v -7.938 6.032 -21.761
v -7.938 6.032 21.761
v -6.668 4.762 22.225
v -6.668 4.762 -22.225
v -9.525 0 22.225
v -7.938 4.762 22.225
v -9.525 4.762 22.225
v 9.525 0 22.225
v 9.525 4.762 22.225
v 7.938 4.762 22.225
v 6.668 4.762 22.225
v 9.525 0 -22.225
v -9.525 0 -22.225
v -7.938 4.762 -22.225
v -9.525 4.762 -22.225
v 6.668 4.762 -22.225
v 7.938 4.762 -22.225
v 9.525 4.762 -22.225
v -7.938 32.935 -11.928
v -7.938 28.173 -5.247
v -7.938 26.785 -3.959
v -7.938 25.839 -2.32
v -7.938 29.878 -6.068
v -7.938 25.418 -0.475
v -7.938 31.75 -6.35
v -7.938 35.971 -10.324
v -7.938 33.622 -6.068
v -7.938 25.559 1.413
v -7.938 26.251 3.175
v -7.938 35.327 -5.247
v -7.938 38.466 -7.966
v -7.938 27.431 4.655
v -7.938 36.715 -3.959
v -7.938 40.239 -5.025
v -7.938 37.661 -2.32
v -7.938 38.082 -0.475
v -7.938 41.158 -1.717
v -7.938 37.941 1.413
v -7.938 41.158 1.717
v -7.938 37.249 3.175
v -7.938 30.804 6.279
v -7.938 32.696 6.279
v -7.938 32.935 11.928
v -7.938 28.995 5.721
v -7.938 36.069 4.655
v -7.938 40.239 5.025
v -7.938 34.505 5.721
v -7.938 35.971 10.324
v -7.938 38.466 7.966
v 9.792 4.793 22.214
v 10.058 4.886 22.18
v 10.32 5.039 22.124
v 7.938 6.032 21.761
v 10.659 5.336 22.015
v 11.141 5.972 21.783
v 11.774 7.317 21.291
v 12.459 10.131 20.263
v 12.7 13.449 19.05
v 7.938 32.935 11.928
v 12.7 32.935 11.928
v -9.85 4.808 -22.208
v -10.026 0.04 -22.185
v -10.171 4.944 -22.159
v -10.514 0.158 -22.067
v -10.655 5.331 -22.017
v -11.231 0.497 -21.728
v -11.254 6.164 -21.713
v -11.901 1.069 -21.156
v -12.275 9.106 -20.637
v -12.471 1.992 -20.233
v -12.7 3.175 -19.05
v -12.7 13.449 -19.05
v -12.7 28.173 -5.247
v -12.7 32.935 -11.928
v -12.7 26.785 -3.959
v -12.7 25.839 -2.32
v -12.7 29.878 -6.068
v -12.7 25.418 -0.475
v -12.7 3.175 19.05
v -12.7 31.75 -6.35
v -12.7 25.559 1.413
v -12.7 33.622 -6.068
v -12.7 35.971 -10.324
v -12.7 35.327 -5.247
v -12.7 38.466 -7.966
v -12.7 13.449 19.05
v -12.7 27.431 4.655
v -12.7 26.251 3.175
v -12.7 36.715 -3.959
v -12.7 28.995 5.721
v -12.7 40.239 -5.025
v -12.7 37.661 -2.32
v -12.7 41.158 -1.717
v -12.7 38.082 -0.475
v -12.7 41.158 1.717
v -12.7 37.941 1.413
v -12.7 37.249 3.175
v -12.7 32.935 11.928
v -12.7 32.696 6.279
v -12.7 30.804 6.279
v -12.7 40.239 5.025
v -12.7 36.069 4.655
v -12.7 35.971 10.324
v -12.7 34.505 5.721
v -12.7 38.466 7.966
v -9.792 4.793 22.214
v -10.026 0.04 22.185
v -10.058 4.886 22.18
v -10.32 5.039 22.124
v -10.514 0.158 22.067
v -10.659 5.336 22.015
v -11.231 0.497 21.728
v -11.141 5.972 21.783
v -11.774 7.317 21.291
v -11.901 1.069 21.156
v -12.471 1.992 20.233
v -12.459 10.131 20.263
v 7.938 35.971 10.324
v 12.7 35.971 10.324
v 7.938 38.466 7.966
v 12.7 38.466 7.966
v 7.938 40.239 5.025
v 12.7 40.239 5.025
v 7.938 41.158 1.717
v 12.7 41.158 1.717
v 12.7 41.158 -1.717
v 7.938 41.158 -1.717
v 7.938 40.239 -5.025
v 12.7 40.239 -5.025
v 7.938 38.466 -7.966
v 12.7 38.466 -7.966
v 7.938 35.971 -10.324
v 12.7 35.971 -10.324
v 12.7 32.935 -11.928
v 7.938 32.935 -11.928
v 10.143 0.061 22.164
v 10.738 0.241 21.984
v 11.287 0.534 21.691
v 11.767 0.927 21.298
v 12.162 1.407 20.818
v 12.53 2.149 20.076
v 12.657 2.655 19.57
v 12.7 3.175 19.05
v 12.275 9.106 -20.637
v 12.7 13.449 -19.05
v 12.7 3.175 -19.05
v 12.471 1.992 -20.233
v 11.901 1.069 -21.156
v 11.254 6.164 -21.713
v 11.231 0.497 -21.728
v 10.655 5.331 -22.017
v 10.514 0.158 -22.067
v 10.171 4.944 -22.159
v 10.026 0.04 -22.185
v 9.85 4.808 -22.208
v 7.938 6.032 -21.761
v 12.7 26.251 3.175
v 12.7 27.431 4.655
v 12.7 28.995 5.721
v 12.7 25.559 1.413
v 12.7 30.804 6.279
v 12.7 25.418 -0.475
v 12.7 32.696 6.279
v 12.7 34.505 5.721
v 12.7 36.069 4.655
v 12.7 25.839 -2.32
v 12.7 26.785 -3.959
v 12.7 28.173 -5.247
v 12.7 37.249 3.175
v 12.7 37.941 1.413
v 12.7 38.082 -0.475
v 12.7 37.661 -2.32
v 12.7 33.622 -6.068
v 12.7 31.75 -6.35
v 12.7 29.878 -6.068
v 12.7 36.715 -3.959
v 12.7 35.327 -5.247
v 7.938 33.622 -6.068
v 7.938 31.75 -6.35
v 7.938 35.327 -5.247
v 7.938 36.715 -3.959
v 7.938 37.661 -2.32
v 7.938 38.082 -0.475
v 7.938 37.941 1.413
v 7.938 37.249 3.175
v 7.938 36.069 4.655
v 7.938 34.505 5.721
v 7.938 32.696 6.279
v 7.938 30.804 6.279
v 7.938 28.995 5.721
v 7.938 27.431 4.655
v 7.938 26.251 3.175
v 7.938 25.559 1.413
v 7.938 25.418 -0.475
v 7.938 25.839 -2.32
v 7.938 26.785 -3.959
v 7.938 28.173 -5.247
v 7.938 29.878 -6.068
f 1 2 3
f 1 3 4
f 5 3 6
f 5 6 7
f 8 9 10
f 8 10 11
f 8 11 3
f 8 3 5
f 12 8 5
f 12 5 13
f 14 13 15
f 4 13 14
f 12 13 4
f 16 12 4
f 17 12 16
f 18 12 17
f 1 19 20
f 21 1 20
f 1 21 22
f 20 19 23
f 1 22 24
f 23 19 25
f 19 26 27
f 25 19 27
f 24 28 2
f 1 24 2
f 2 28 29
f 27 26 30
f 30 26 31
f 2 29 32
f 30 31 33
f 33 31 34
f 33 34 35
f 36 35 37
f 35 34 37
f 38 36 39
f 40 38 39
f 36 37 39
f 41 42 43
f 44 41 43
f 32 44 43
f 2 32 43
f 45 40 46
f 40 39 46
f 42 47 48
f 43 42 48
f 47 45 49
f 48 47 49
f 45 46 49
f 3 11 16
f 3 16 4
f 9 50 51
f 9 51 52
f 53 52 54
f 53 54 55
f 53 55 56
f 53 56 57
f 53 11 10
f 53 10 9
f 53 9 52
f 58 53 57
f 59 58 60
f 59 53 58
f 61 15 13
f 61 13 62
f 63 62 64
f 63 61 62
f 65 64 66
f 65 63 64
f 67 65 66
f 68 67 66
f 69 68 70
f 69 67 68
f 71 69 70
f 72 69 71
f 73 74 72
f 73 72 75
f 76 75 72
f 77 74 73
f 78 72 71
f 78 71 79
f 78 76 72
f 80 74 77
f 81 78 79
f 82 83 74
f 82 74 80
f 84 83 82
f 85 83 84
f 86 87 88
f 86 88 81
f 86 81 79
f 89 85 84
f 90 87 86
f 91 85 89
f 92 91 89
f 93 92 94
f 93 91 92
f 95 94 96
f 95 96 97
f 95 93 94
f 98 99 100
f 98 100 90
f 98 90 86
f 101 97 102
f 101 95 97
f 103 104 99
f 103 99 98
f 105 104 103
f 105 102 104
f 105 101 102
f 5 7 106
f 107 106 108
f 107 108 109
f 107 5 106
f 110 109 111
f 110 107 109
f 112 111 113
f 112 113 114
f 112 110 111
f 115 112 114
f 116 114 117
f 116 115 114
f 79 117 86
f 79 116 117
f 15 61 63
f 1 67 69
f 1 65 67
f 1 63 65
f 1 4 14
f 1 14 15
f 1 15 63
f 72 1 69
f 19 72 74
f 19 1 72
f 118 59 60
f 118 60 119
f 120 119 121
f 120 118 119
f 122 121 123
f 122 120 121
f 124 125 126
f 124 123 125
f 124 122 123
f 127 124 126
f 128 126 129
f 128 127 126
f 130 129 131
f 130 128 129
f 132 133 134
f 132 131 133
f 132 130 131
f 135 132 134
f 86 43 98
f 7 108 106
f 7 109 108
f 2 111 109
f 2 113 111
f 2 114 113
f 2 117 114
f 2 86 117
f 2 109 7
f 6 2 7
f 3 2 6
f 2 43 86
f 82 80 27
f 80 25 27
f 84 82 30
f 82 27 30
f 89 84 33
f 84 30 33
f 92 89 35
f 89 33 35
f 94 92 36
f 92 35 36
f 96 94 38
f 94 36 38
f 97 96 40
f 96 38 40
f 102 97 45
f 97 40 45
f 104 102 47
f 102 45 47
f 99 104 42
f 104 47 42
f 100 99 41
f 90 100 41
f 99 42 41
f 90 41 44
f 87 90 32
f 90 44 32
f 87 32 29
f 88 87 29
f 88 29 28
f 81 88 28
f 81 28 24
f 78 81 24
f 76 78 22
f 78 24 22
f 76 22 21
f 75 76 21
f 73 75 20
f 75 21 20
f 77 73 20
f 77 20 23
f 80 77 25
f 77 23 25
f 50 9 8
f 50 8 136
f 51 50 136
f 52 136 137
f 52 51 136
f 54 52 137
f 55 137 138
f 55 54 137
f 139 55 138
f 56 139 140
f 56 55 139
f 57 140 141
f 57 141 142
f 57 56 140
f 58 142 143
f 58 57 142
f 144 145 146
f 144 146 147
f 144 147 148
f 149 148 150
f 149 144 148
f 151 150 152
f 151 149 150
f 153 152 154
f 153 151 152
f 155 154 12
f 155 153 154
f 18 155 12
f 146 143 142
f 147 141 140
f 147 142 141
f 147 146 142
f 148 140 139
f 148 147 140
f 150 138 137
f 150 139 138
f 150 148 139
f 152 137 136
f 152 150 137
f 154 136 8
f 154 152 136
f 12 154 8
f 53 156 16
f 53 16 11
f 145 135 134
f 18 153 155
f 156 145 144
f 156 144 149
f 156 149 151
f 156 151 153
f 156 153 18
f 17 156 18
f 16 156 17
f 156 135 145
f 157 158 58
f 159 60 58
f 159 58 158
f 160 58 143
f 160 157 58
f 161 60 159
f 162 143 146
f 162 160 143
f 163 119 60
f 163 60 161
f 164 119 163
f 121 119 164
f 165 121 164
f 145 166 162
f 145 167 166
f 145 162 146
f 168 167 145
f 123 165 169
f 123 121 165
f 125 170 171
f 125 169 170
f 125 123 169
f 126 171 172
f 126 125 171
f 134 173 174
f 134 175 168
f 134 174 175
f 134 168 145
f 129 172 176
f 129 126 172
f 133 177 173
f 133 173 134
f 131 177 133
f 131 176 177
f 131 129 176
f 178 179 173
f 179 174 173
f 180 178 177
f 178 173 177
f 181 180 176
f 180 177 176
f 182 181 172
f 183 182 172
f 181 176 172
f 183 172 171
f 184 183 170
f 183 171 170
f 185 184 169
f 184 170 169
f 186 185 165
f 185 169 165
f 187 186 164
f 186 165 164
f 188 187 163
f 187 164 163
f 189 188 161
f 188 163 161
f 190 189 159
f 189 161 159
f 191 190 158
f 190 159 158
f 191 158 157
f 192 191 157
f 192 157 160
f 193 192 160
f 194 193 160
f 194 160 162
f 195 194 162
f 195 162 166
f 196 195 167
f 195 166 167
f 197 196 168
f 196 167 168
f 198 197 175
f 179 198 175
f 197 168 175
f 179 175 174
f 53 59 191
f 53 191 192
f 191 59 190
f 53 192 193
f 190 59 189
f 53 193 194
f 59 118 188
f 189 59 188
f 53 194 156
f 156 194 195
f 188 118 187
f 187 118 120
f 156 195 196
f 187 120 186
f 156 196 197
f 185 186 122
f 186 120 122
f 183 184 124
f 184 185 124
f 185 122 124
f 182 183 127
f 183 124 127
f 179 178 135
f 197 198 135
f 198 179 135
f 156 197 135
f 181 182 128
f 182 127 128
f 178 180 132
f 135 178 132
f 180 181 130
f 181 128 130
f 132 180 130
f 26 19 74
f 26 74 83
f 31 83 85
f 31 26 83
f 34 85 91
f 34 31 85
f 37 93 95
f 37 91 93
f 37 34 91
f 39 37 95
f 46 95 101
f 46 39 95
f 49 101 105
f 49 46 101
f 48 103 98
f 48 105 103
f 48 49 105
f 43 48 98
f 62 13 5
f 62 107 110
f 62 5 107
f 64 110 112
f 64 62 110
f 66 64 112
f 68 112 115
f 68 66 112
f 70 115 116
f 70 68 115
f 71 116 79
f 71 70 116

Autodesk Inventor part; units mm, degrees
sketch "Sketch1" plane through (0, 0, 0) normal (0, 1, 0) x (-1, 0, 0)
  line L0 (7.9375, 22.225) -> (-7.9375, 22.225)
  line L1 (-7.9375, 22.225) -> (-7.9375, -22.225)
  line L2 (-7.9375, -22.225) -> (7.9375, -22.225)
  line L3 (7.9375, -22.225) -> (7.9375, 22.225)
  line L4 (7.9375, 22.225) -> (-7.9375, -22.225) construction
  line L5 (-7.9375, 22.225) -> (7.9375, -22.225) construction
  point P0 (0, 0)
  point P1 (-50.8, 0)
  dimension "d0" = 15.875
  dimension "d1" = 44.45
extrude "Base" add sketch "Sketch1" along normal blind 4.7625
sketch "Sketch2" plane through (7.9375, 0, 22.225) normal (1, 0, 0) x (0, 0, -1)
  line L0 (0, 0) -> (0, 4.7625) projected
  line L1 (0, 4.7625) -> (10.2968, 32.9347)
  line L2 (0, 4.7625) -> (44.45, 4.7625) projected
  line L3 (34.1532, 32.9347) -> (44.45, 4.7625)
  line L4 (0, 0) -> (44.45, 0) projected
  arc A0 (34.1532, 32.9347) -> (10.2968, 32.9347) centre (22.225, 28.575) ccw
  line L5 (0, 0) -> (44.45, 0) projected
  line L6 (44.45, 0) -> (44.45, 4.7625) projected
  line L7 (0, 4.7625) -> (44.45, 4.7625) projected
  line L8 (0, 0) -> (0, 4.7625) projected
  point P0 (22.225, 0)
  point P1 (22.225, 41.275)
  dimension "d10" = 12.7
  dimension "d12" = 41.275
extrude "Vertical 1" add sketch "Sketch2" along normal blind 4.7625
sketch "Sketch5" plane through (-7.9375, 0, -22.225) normal (-1, 0, 0) x (0, 0, 1)
  line L0 (44.45, 4.7625) -> (44.45, 0) projected
  line L1 (44.45, 0) -> (0, 0) projected
  line L2 (0, 0) -> (0, 4.7625) projected
  line L3 (0, 4.7625) -> (10.2968, 32.9347) projected
  arc A0 (34.1532, 32.9347) -> (10.2968, 32.9347) centre (22.225, 28.575) ccw projected
  line L4 (34.1532, 32.9347) -> (44.45, 4.7625) projected
extrude "Vertical 2" add sketch "Sketch5" along normal blind 4.7625
sketch "Sketch6" plane through (12.7, 0, 22.225) normal (1, 0, 0) x (0, 0, -1)
  line L0 (22.225, 0) -> (22.225, 41.275) construction
  arc A0 (34.1532, 32.9347) -> (10.2968, 32.9347) centre (22.225, 28.575) ccw projected
  circle A1 centre (22.225, 31.75) radius 6.35
  dimension "d29" = 12.7
  dimension "d30" = 9.525
extrude "Extrusion8" cut sketch "Sketch6" against normal through all
fillet "Fillet2" radius 3.175 6 edges at (-12.7, 0, 0) (-12.7, 2.3813, -22.225) (12.7, 2.3813, -22.225) (12.7, 2.3813, 22.225) (12.7, 0, 0) (-12.7, 2.3813, 22.225)
chamfer "Chamfer2" distance 1.27 angle 45 2 edges at (-7.9375, 4.7625, 0) (7.9375, 4.7625, 0)
ref_plane "Work Plane2" through (0, 31.75, 0) normal (0, 1, 0) x (-1, 0, 0)
ref_plane "Work Plane1" through (0, 0, 22.225) normal (-1, 0, 0) x (0, 0, 1)
equation "\"BendRadius\" = Thickness"
equation "\"BendReliefWidth\" = Thickness"
equation "\"BendReliefDepth\" = 0.5 * Thickness"
equation "\"CornerReliefSize\" = 4 * Thickness"
equation "\"MinimumRemnant\" = 2 * Thickness"
equation "\"TransitionRadius\" = BendRadius"
equation "\"JacobiRadiusSize\" = BendRadius"
equation "\"GapSize\" = Thickness"
equation "\"Thickness\" = 3.048"
properties part number "0.5 in Rod End Bracket (Rough)"
